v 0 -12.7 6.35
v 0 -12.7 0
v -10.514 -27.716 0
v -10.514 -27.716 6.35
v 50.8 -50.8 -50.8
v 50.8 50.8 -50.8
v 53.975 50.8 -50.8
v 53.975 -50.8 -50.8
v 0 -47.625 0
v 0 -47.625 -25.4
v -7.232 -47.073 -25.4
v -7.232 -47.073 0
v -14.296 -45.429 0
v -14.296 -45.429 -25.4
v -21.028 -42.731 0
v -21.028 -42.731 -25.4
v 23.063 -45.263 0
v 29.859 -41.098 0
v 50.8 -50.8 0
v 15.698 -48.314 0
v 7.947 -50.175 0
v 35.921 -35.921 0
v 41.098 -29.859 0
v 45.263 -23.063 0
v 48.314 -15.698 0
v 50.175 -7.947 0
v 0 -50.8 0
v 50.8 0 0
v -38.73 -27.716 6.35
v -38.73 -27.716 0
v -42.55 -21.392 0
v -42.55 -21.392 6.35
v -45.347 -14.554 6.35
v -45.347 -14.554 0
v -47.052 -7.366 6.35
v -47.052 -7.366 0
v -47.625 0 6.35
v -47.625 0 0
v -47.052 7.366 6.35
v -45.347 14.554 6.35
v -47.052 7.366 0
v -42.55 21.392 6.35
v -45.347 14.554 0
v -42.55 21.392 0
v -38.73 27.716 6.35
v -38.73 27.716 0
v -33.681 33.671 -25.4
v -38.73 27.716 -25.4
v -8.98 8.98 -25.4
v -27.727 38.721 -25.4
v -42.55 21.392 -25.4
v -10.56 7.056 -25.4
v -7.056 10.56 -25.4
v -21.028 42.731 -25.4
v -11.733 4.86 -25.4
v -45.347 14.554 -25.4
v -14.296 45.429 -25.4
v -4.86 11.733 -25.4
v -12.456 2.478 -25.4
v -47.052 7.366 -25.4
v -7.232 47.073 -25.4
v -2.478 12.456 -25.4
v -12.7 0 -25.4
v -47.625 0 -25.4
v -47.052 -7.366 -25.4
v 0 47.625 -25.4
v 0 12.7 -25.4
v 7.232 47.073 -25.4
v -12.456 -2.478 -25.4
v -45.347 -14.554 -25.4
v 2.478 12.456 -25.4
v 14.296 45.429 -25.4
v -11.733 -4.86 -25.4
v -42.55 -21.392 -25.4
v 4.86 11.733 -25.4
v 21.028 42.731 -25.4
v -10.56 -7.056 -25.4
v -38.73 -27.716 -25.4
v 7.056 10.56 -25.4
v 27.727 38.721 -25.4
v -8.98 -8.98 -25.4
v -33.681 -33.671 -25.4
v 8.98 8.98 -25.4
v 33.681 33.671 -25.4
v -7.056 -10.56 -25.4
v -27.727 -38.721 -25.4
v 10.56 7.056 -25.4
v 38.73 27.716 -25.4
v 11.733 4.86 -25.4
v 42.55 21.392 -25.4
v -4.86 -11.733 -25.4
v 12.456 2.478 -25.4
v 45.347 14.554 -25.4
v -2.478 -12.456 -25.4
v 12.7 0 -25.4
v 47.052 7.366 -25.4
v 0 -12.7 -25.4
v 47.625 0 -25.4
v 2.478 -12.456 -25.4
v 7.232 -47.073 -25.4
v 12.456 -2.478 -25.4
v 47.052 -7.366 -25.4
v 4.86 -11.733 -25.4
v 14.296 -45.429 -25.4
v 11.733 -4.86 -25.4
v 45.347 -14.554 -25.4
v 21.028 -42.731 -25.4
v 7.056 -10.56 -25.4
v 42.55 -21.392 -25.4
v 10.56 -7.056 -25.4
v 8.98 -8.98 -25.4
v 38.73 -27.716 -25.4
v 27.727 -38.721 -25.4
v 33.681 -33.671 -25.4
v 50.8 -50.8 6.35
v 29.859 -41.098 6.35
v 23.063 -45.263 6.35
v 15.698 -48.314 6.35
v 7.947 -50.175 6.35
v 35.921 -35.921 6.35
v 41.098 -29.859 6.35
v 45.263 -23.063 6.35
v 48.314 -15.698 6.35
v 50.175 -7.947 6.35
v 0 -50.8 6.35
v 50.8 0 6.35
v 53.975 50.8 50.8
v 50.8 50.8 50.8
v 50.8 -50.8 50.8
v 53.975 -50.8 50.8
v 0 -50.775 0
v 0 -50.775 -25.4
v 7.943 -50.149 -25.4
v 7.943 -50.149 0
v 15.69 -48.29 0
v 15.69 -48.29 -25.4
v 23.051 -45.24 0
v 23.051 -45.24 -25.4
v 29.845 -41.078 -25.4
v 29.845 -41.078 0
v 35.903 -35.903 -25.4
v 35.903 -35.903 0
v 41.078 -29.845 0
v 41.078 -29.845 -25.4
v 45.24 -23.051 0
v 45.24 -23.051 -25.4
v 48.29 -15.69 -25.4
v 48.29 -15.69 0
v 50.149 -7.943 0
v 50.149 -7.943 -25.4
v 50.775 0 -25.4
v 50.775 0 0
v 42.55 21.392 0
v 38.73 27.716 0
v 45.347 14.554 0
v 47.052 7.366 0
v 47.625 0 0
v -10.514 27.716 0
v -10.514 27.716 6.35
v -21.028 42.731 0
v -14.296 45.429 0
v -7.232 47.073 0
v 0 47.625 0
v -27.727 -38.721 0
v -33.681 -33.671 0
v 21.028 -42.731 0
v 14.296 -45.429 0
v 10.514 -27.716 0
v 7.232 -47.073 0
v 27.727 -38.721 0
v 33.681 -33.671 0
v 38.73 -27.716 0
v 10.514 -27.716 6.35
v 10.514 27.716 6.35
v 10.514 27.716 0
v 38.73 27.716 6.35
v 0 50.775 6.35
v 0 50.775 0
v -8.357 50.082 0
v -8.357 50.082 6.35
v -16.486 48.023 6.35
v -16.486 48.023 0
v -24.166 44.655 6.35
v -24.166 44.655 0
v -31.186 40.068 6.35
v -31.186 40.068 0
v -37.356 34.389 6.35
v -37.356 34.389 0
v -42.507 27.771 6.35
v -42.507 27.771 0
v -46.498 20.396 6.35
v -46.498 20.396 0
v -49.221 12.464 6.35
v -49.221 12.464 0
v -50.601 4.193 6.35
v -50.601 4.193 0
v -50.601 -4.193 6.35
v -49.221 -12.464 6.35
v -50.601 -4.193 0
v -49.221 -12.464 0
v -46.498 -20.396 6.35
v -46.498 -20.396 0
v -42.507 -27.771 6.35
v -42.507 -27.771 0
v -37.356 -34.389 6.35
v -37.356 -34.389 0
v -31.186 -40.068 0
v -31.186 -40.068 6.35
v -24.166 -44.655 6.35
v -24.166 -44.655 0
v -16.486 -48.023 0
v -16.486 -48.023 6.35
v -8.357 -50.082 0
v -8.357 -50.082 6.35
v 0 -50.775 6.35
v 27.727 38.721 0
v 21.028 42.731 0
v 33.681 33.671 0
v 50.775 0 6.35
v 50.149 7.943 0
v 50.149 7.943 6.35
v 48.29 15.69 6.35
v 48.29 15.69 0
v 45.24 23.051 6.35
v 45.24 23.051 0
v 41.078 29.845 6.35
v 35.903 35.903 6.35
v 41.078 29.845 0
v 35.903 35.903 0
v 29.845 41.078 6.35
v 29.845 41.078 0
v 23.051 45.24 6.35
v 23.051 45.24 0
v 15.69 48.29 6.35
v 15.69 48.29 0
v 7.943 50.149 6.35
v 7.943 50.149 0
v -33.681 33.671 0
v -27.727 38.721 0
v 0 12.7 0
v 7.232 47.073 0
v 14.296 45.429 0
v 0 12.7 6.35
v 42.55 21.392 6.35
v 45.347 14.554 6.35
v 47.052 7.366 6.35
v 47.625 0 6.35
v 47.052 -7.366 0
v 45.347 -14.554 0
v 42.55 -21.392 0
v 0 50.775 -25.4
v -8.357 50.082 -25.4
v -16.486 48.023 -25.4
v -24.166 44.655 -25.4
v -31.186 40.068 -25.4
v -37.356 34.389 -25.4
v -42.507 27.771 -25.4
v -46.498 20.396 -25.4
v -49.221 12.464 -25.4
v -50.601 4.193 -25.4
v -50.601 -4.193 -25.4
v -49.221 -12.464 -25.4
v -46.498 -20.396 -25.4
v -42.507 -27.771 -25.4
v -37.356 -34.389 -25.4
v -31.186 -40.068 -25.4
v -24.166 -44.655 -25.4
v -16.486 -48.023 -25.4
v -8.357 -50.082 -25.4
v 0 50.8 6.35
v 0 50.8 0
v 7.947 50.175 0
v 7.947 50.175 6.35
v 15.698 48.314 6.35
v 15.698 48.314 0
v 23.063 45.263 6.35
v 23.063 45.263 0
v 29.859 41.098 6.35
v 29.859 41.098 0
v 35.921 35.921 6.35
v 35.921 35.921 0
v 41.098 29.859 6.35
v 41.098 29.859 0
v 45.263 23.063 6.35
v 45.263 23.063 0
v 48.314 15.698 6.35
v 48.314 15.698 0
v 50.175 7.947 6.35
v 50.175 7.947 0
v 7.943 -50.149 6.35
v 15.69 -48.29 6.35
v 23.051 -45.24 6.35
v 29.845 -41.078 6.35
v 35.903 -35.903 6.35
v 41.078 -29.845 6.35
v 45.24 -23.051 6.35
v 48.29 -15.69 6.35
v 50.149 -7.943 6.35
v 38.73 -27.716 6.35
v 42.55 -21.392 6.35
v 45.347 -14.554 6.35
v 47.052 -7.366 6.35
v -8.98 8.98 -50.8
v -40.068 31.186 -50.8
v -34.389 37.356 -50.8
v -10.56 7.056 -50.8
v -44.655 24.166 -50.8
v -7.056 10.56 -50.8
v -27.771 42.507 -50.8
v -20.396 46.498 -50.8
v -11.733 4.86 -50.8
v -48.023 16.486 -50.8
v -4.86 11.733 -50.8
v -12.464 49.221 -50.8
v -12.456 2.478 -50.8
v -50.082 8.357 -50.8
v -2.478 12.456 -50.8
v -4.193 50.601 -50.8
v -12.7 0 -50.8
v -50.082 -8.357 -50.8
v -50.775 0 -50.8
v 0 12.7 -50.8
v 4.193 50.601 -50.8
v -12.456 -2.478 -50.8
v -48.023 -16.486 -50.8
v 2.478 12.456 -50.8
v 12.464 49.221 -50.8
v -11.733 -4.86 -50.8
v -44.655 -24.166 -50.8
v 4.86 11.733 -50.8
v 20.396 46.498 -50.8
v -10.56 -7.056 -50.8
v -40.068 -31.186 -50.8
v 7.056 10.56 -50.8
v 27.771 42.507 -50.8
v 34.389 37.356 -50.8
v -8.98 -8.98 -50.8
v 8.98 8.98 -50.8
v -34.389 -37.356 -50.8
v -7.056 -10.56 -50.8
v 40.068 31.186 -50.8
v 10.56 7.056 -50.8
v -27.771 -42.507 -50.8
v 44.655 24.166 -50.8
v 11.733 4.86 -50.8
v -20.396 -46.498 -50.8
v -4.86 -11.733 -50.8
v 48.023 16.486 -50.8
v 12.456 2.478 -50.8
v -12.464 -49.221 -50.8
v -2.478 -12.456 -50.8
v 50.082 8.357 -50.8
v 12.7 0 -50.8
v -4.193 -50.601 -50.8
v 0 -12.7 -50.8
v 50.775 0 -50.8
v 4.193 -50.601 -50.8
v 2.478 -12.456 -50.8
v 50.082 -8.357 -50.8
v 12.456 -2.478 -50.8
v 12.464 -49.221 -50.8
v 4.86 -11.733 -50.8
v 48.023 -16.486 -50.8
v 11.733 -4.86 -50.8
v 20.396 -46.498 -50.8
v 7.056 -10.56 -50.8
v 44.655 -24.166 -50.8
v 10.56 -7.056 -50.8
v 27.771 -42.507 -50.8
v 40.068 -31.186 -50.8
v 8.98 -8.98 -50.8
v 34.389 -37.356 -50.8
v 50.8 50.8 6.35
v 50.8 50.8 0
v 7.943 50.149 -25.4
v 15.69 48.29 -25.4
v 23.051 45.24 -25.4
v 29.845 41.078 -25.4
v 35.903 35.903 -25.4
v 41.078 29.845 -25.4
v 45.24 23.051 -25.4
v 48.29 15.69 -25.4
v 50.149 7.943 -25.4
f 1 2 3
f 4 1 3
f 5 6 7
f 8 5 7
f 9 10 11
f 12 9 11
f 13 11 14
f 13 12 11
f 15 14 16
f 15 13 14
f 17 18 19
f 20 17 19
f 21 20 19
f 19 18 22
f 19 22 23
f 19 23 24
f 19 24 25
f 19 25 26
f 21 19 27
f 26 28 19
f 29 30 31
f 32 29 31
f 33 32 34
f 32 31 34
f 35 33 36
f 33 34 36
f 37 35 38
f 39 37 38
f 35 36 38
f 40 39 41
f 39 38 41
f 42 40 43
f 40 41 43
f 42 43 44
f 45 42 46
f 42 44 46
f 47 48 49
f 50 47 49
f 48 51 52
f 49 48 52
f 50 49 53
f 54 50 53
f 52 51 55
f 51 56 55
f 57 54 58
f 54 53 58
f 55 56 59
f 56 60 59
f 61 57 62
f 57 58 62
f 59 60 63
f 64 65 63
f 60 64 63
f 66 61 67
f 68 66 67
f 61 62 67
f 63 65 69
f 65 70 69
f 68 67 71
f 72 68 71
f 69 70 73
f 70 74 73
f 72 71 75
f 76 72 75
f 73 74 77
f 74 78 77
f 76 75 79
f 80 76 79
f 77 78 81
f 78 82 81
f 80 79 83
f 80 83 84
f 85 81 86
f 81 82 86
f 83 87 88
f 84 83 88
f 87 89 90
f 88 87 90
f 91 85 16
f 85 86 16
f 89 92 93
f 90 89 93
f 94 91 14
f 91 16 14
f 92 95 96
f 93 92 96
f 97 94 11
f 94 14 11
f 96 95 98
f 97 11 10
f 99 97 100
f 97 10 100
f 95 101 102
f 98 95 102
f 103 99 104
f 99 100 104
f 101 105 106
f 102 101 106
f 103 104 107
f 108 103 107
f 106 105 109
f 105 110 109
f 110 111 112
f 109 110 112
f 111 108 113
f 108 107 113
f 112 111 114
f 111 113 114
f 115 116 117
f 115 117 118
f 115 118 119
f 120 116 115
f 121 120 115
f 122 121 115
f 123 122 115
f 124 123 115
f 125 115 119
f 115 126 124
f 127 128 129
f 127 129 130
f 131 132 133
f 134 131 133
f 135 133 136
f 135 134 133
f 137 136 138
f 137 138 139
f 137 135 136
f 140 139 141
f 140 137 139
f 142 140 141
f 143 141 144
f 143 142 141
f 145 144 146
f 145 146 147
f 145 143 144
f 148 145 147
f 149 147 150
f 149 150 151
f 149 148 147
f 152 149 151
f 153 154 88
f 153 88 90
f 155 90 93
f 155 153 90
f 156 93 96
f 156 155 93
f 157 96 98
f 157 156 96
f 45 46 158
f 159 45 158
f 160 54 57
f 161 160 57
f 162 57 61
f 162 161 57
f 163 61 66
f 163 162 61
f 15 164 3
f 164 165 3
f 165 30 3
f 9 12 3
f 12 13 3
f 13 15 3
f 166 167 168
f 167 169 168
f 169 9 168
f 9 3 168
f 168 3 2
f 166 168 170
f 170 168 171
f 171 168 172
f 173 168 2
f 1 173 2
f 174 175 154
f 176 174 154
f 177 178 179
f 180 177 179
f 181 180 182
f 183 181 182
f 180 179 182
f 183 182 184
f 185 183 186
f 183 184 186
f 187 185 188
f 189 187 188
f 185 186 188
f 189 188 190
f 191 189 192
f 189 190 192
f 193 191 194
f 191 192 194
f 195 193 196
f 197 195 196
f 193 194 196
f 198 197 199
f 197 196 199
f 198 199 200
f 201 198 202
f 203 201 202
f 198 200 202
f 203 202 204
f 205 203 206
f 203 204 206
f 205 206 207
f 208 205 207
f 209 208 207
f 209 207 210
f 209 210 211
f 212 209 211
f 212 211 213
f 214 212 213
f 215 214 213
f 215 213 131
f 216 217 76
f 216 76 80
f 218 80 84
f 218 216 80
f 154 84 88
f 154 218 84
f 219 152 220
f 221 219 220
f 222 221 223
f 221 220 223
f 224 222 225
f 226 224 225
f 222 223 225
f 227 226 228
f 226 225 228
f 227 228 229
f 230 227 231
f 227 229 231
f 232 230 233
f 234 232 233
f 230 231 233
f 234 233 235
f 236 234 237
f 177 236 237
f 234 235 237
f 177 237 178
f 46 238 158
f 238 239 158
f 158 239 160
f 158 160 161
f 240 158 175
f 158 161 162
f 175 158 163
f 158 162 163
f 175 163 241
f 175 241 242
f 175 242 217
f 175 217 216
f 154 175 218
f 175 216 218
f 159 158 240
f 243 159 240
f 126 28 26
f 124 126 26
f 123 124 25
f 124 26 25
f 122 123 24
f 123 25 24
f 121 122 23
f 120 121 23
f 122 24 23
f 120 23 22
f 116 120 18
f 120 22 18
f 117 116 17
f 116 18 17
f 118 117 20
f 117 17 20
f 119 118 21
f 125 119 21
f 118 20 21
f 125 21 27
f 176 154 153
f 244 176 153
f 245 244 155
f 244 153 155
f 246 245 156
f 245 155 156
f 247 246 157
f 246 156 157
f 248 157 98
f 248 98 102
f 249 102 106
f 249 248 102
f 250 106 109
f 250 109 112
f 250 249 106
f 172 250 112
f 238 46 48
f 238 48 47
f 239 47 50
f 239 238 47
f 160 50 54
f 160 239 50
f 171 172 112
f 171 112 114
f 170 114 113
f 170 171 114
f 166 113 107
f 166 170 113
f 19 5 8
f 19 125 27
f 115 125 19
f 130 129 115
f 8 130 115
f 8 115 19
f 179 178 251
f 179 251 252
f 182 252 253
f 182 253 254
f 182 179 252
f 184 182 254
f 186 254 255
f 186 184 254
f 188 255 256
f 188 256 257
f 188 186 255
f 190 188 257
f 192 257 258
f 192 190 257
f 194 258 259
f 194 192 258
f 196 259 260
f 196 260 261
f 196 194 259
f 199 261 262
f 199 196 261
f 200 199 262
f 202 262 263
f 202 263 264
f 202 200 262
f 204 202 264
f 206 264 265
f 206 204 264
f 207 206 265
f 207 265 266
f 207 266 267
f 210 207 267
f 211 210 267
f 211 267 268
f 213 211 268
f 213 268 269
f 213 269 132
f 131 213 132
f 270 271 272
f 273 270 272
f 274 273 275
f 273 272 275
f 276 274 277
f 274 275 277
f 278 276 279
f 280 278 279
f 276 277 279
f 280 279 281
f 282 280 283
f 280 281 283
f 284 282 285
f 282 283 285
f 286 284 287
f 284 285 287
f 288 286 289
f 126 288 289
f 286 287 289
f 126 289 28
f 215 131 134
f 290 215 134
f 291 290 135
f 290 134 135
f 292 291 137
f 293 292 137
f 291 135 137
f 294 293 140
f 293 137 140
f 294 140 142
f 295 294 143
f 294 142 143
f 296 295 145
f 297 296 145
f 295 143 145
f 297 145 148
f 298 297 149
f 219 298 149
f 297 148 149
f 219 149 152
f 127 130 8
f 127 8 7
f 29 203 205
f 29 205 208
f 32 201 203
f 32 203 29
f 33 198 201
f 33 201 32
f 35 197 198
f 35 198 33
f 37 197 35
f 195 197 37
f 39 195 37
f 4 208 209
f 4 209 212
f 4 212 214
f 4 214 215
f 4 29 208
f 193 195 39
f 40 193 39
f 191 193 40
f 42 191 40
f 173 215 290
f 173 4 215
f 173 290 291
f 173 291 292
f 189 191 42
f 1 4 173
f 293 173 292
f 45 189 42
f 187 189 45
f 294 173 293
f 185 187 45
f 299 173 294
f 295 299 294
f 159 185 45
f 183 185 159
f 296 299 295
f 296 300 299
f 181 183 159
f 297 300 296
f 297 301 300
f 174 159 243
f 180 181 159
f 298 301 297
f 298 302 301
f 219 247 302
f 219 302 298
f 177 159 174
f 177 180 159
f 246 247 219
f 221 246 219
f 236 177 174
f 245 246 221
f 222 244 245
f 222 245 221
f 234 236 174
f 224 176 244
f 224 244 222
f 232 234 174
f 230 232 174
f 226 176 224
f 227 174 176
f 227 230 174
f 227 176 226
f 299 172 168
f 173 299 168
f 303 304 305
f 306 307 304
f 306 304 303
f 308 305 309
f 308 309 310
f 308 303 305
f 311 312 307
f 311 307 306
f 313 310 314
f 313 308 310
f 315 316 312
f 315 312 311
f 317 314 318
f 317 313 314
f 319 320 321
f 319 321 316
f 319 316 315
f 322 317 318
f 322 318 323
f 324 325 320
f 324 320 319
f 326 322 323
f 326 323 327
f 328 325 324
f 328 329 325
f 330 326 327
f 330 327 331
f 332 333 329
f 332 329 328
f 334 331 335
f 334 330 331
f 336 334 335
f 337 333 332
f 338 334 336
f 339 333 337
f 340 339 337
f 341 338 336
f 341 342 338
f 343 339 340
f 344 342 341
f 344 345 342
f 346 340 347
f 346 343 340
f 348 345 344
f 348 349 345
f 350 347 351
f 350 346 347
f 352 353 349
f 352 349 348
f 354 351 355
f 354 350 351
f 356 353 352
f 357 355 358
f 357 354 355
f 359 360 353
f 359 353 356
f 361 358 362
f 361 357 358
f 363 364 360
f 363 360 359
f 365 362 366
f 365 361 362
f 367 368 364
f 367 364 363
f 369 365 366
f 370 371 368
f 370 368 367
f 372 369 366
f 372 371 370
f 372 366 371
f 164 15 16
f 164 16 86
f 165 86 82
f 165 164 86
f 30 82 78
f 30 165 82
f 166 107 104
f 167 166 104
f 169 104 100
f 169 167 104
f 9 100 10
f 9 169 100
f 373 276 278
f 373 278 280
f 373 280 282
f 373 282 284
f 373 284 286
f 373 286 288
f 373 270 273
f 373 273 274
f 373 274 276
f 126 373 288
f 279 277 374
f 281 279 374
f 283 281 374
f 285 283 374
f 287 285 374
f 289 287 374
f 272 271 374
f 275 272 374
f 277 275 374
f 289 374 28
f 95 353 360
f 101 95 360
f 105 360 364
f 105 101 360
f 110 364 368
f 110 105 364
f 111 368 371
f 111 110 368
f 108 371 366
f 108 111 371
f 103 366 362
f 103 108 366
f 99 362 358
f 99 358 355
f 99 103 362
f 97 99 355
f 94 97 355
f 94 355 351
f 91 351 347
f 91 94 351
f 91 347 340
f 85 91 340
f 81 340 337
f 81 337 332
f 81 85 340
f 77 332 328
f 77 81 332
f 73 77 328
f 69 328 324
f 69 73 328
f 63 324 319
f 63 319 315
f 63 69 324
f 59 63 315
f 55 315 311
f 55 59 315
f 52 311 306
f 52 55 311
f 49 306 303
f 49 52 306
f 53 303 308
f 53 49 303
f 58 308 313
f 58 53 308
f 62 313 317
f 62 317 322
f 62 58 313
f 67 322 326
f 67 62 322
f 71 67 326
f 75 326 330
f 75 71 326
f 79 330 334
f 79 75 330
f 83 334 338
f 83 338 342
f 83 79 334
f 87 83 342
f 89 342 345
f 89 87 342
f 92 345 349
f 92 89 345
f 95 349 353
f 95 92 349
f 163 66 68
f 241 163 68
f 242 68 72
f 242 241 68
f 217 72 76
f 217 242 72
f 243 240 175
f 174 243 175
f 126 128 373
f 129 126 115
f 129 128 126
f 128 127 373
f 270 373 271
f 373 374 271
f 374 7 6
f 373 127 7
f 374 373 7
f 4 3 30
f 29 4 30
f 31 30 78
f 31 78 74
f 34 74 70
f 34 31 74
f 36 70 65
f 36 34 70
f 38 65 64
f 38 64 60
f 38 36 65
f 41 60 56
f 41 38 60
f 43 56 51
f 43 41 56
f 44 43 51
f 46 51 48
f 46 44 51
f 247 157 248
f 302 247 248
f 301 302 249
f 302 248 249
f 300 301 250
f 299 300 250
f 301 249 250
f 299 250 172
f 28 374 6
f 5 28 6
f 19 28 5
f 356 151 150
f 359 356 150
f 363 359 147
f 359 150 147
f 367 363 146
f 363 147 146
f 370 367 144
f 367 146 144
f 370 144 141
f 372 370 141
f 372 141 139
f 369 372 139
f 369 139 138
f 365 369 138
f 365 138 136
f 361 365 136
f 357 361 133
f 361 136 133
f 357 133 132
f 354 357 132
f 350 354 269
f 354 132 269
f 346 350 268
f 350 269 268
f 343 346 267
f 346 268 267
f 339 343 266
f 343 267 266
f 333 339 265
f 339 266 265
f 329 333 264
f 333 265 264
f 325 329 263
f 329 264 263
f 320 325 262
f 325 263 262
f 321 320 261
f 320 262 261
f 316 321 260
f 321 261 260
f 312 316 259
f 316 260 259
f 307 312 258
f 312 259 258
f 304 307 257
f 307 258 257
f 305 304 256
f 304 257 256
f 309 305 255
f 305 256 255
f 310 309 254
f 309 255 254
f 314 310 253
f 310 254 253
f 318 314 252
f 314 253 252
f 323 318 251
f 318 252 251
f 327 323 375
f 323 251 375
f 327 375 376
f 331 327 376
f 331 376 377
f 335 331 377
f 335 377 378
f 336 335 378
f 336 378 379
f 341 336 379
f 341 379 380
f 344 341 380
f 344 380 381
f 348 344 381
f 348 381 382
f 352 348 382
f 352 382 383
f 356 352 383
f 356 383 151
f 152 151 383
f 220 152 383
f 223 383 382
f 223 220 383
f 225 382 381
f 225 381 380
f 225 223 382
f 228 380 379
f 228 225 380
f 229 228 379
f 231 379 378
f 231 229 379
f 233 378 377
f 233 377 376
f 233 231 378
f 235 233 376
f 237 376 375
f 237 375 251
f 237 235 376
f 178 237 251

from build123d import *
from build123d import SkipClean  # not in build123d's __all__

# Parameters (mm, degrees)
F1_DEPTH = 50.8
F2_DEPTH = 6.35
F3_DEPTH = 25.4
F4_R     = 50.7746
F4_R_2   = 47.625
F4_R_3   = 12.7
F5_DEPTH = 25.4


# Not quite as in the source:
# - after a boolean that leaves OpenCascade's solid faulty, fix() repairs it


with BuildPart() as f1:
    # F0 (on Top) → F1 (new body, symmetric)
    with BuildSketch(Plane.XY):
        Polygon((50.8, 50.8), (50.8, 0), (50.8, -50.8), (53.975, -50.8), (53.975, 50.8), align=None)
    extrude(amount=F1_DEPTH, both=True)

    # F0 (on Top) → F2 (join)
    with BuildSketch(Plane.XY):
        with BuildLine():
            Line((50.8, 50.8), (0, 50.8))
            ThreePointArc((0, 50.8), (35.9210244843, 35.9210244843), (50.8, 0))
            Line((50.8, 0), (50.8, 50.8))
        make_face()
        with BuildLine():
            ThreePointArc((50.8, 0), (35.9210244843, -35.9210244843), (0, -50.8))
            Line((0, -50.8), (50.8, -50.8))
            Line((50.8, -50.8), (50.8, 0))
        make_face()
    extrude(amount=F2_DEPTH)


with BuildPart() as f2:
    # F0 (on Top) → F2, piece 2 (new body)
    with BuildSketch(Plane.XY):
        with BuildLine():
            ThreePointArc((38.7296379439, 27.7156232067), (45.3466626781, 14.5540650322), (47.625, 0))
            ThreePointArc((47.625, 0), (45.3466626781, -14.5540650322), (38.7296379439, -27.7156232067))
            ThreePointArc((38.7296379439, -27.7156232067), (30.8076970757, -36.318403405), (21.0281051205, -42.7312464134))
            ThreePointArc((21.0281051205, -42.7312464134), (10.7950223382, -46.3854300155), (0, -47.625))
            Line((0, -47.625), (0, -50.7746))
            ThreePointArc((0, -50.7746), (35.903063972, -35.903063972), (50.7746, 0))
            ThreePointArc((50.7746, 0), (35.903063972, 35.903063972), (0, 50.7746))
            Line((0, 50.7746), (0, 47.625))
            ThreePointArc((0, 47.625), (10.7950223382, 46.3854300155), (21.0281051205, 42.7312464134))
            ThreePointArc((21.0281051205, 42.7312464134), (30.8076970757, 36.318403405), (38.7296379439, 27.7156232067))
        make_face()
        with BuildLine():
            ThreePointArc((-21.0281051205, 42.7312464134), (-10.7950223382, 46.3854300155), (0, 47.625))
            Line((0, 47.625), (0, 50.7746))
            ThreePointArc((0, 50.7746), (-50.7746, 0), (0, -50.7746))
            Line((0, -50.7746), (0, -47.625))
            ThreePointArc((0, -47.625), (-10.7950223382, -46.3854300155), (-21.0281051205, -42.7312464134))
            ThreePointArc((-21.0281051205, -42.7312464134), (-30.8076970757, -36.318403405), (-38.7296379439, -27.7156232067))
            ThreePointArc((-38.7296379439, -27.7156232067), (-47.625, 0), (-38.7296379439, 27.7156232067))
            ThreePointArc((-38.7296379439, 27.7156232067), (-30.8076970757, 36.318403405), (-21.0281051205, 42.7312464134))
        make_face()
        with BuildLine():
            Line((-10.5140525602, 27.7156232067), (-21.0281051205, 42.7312464134))
            ThreePointArc((-21.0281051205, 42.7312464134), (-30.8076970757, 36.318403405), (-38.7296379439, 27.7156232067))
            Line((-38.7296379439, 27.7156232067), (-10.5140525602, 27.7156232067))
        make_face()
        with BuildLine():
            Line((0, 12.7), (0, 47.625))
            ThreePointArc((0, 47.625), (-10.7950223382, 46.3854300155), (-21.0281051205, 42.7312464134))
            Line((-21.0281051205, 42.7312464134), (-10.5140525602, 27.7156232067))
            Line((-10.5140525602, 27.7156232067), (0, 12.7))
        make_face()
        with BuildLine():
            Line((10.5140525602, 27.7156232067), (21.0281051205, 42.7312464134))
            ThreePointArc((21.0281051205, 42.7312464134), (10.7950223382, 46.3854300155), (0, 47.625))
            Line((0, 47.625), (0, 12.7))
            Line((0, 12.7), (10.5140525602, 27.7156232067))
        make_face()
        with BuildLine():
            Line((10.5140525602, 27.7156232067), (38.7296379439, 27.7156232067))
            ThreePointArc((38.7296379439, 27.7156232067), (30.8076970757, 36.318403405), (21.0281051205, 42.7312464134))
            Line((21.0281051205, 42.7312464134), (10.5140525602, 27.7156232067))
        make_face()
        with BuildLine():
            ThreePointArc((21.0281051205, -42.7312464134), (30.8076970757, -36.318403405), (38.7296379439, -27.7156232067))
            Line((38.7296379439, -27.7156232067), (10.5140525602, -27.7156232067))
            Line((10.5140525602, -27.7156232067), (21.0281051205, -42.7312464134))
        make_face()
        with BuildLine():
            ThreePointArc((0, -47.625), (10.7950223382, -46.3854300155), (21.0281051205, -42.7312464134))
            Line((21.0281051205, -42.7312464134), (10.5140525602, -27.7156232067))
            Line((10.5140525602, -27.7156232067), (0, -12.7))
            Line((0, -12.7), (0, -47.625))
        make_face()
        with BuildLine():
            ThreePointArc((-21.0281051205, -42.7312464134), (-10.7950223382, -46.3854300155), (0, -47.625))
            Line((0, -47.625), (0, -12.7))
            Line((0, -12.7), (-10.5140525602, -27.7156232067))
            Line((-10.5140525602, -27.7156232067), (-21.0281051205, -42.7312464134))
        make_face()
        with BuildLine():
            ThreePointArc((-38.7296379439, -27.7156232067), (-30.8076970757, -36.318403405), (-21.0281051205, -42.7312464134))
            Line((-21.0281051205, -42.7312464134), (-10.5140525602, -27.7156232067))
            Line((-10.5140525602, -27.7156232067), (-38.7296379439, -27.7156232067))
        make_face()
    extrude(amount=F2_DEPTH)

    # F0 (on Top) → F3 (join)
    with BuildSketch(Plane.XY):
        with BuildLine():
            ThreePointArc((-21.0281051205, 42.7312464134), (-10.7950223382, 46.3854300155), (0, 47.625))
            Line((0, 47.625), (0, 50.7746))
            ThreePointArc((0, 50.7746), (-50.7746, 0), (0, -50.7746))
            Line((0, -50.7746), (0, -47.625))
            ThreePointArc((0, -47.625), (-10.7950223382, -46.3854300155), (-21.0281051205, -42.7312464134))
            ThreePointArc((-21.0281051205, -42.7312464134), (-30.8076970757, -36.318403405), (-38.7296379439, -27.7156232067))
            ThreePointArc((-38.7296379439, -27.7156232067), (-47.625, 0), (-38.7296379439, 27.7156232067))
            ThreePointArc((-38.7296379439, 27.7156232067), (-30.8076970757, 36.318403405), (-21.0281051205, 42.7312464134))
        make_face()
        with BuildLine():
            ThreePointArc((38.7296379439, 27.7156232067), (45.3466626781, 14.5540650322), (47.625, 0))
            ThreePointArc((47.625, 0), (45.3466626781, -14.5540650322), (38.7296379439, -27.7156232067))
            ThreePointArc((38.7296379439, -27.7156232067), (30.8076970757, -36.318403405), (21.0281051205, -42.7312464134))
            ThreePointArc((21.0281051205, -42.7312464134), (10.7950223382, -46.3854300155), (0, -47.625))
            Line((0, -47.625), (0, -50.7746))
            ThreePointArc((0, -50.7746), (35.903063972, -35.903063972), (50.7746, 0))
            ThreePointArc((50.7746, 0), (35.903063972, 35.903063972), (0, 50.7746))
            Line((0, 50.7746), (0, 47.625))
            ThreePointArc((0, 47.625), (10.7950223382, 46.3854300155), (21.0281051205, 42.7312464134))
            ThreePointArc((21.0281051205, 42.7312464134), (30.8076970757, 36.318403405), (38.7296379439, 27.7156232067))
        make_face()
    with SkipClean():  # cleaning this boolean's faces spoils the solid; the shape is the same uncleaned
        extrude(amount=-F3_DEPTH)

    # F4 (on face) → F5 (join)
    with BuildSketch(Plane(origin=(0, 0, -25.4), x_dir=(1, 0, 0), z_dir=(0, 0, -1))):
        Circle(F4_R)
        Circle(F4_R_2, mode=Mode.SUBTRACT)
        Circle(F4_R_2)
        Circle(F4_R_3, mode=Mode.SUBTRACT)
    extrude(amount=F5_DEPTH)

    add(f2.part.fix(), mode=Mode.REPLACE)


solid = Compound([f1.part, f2.part])
